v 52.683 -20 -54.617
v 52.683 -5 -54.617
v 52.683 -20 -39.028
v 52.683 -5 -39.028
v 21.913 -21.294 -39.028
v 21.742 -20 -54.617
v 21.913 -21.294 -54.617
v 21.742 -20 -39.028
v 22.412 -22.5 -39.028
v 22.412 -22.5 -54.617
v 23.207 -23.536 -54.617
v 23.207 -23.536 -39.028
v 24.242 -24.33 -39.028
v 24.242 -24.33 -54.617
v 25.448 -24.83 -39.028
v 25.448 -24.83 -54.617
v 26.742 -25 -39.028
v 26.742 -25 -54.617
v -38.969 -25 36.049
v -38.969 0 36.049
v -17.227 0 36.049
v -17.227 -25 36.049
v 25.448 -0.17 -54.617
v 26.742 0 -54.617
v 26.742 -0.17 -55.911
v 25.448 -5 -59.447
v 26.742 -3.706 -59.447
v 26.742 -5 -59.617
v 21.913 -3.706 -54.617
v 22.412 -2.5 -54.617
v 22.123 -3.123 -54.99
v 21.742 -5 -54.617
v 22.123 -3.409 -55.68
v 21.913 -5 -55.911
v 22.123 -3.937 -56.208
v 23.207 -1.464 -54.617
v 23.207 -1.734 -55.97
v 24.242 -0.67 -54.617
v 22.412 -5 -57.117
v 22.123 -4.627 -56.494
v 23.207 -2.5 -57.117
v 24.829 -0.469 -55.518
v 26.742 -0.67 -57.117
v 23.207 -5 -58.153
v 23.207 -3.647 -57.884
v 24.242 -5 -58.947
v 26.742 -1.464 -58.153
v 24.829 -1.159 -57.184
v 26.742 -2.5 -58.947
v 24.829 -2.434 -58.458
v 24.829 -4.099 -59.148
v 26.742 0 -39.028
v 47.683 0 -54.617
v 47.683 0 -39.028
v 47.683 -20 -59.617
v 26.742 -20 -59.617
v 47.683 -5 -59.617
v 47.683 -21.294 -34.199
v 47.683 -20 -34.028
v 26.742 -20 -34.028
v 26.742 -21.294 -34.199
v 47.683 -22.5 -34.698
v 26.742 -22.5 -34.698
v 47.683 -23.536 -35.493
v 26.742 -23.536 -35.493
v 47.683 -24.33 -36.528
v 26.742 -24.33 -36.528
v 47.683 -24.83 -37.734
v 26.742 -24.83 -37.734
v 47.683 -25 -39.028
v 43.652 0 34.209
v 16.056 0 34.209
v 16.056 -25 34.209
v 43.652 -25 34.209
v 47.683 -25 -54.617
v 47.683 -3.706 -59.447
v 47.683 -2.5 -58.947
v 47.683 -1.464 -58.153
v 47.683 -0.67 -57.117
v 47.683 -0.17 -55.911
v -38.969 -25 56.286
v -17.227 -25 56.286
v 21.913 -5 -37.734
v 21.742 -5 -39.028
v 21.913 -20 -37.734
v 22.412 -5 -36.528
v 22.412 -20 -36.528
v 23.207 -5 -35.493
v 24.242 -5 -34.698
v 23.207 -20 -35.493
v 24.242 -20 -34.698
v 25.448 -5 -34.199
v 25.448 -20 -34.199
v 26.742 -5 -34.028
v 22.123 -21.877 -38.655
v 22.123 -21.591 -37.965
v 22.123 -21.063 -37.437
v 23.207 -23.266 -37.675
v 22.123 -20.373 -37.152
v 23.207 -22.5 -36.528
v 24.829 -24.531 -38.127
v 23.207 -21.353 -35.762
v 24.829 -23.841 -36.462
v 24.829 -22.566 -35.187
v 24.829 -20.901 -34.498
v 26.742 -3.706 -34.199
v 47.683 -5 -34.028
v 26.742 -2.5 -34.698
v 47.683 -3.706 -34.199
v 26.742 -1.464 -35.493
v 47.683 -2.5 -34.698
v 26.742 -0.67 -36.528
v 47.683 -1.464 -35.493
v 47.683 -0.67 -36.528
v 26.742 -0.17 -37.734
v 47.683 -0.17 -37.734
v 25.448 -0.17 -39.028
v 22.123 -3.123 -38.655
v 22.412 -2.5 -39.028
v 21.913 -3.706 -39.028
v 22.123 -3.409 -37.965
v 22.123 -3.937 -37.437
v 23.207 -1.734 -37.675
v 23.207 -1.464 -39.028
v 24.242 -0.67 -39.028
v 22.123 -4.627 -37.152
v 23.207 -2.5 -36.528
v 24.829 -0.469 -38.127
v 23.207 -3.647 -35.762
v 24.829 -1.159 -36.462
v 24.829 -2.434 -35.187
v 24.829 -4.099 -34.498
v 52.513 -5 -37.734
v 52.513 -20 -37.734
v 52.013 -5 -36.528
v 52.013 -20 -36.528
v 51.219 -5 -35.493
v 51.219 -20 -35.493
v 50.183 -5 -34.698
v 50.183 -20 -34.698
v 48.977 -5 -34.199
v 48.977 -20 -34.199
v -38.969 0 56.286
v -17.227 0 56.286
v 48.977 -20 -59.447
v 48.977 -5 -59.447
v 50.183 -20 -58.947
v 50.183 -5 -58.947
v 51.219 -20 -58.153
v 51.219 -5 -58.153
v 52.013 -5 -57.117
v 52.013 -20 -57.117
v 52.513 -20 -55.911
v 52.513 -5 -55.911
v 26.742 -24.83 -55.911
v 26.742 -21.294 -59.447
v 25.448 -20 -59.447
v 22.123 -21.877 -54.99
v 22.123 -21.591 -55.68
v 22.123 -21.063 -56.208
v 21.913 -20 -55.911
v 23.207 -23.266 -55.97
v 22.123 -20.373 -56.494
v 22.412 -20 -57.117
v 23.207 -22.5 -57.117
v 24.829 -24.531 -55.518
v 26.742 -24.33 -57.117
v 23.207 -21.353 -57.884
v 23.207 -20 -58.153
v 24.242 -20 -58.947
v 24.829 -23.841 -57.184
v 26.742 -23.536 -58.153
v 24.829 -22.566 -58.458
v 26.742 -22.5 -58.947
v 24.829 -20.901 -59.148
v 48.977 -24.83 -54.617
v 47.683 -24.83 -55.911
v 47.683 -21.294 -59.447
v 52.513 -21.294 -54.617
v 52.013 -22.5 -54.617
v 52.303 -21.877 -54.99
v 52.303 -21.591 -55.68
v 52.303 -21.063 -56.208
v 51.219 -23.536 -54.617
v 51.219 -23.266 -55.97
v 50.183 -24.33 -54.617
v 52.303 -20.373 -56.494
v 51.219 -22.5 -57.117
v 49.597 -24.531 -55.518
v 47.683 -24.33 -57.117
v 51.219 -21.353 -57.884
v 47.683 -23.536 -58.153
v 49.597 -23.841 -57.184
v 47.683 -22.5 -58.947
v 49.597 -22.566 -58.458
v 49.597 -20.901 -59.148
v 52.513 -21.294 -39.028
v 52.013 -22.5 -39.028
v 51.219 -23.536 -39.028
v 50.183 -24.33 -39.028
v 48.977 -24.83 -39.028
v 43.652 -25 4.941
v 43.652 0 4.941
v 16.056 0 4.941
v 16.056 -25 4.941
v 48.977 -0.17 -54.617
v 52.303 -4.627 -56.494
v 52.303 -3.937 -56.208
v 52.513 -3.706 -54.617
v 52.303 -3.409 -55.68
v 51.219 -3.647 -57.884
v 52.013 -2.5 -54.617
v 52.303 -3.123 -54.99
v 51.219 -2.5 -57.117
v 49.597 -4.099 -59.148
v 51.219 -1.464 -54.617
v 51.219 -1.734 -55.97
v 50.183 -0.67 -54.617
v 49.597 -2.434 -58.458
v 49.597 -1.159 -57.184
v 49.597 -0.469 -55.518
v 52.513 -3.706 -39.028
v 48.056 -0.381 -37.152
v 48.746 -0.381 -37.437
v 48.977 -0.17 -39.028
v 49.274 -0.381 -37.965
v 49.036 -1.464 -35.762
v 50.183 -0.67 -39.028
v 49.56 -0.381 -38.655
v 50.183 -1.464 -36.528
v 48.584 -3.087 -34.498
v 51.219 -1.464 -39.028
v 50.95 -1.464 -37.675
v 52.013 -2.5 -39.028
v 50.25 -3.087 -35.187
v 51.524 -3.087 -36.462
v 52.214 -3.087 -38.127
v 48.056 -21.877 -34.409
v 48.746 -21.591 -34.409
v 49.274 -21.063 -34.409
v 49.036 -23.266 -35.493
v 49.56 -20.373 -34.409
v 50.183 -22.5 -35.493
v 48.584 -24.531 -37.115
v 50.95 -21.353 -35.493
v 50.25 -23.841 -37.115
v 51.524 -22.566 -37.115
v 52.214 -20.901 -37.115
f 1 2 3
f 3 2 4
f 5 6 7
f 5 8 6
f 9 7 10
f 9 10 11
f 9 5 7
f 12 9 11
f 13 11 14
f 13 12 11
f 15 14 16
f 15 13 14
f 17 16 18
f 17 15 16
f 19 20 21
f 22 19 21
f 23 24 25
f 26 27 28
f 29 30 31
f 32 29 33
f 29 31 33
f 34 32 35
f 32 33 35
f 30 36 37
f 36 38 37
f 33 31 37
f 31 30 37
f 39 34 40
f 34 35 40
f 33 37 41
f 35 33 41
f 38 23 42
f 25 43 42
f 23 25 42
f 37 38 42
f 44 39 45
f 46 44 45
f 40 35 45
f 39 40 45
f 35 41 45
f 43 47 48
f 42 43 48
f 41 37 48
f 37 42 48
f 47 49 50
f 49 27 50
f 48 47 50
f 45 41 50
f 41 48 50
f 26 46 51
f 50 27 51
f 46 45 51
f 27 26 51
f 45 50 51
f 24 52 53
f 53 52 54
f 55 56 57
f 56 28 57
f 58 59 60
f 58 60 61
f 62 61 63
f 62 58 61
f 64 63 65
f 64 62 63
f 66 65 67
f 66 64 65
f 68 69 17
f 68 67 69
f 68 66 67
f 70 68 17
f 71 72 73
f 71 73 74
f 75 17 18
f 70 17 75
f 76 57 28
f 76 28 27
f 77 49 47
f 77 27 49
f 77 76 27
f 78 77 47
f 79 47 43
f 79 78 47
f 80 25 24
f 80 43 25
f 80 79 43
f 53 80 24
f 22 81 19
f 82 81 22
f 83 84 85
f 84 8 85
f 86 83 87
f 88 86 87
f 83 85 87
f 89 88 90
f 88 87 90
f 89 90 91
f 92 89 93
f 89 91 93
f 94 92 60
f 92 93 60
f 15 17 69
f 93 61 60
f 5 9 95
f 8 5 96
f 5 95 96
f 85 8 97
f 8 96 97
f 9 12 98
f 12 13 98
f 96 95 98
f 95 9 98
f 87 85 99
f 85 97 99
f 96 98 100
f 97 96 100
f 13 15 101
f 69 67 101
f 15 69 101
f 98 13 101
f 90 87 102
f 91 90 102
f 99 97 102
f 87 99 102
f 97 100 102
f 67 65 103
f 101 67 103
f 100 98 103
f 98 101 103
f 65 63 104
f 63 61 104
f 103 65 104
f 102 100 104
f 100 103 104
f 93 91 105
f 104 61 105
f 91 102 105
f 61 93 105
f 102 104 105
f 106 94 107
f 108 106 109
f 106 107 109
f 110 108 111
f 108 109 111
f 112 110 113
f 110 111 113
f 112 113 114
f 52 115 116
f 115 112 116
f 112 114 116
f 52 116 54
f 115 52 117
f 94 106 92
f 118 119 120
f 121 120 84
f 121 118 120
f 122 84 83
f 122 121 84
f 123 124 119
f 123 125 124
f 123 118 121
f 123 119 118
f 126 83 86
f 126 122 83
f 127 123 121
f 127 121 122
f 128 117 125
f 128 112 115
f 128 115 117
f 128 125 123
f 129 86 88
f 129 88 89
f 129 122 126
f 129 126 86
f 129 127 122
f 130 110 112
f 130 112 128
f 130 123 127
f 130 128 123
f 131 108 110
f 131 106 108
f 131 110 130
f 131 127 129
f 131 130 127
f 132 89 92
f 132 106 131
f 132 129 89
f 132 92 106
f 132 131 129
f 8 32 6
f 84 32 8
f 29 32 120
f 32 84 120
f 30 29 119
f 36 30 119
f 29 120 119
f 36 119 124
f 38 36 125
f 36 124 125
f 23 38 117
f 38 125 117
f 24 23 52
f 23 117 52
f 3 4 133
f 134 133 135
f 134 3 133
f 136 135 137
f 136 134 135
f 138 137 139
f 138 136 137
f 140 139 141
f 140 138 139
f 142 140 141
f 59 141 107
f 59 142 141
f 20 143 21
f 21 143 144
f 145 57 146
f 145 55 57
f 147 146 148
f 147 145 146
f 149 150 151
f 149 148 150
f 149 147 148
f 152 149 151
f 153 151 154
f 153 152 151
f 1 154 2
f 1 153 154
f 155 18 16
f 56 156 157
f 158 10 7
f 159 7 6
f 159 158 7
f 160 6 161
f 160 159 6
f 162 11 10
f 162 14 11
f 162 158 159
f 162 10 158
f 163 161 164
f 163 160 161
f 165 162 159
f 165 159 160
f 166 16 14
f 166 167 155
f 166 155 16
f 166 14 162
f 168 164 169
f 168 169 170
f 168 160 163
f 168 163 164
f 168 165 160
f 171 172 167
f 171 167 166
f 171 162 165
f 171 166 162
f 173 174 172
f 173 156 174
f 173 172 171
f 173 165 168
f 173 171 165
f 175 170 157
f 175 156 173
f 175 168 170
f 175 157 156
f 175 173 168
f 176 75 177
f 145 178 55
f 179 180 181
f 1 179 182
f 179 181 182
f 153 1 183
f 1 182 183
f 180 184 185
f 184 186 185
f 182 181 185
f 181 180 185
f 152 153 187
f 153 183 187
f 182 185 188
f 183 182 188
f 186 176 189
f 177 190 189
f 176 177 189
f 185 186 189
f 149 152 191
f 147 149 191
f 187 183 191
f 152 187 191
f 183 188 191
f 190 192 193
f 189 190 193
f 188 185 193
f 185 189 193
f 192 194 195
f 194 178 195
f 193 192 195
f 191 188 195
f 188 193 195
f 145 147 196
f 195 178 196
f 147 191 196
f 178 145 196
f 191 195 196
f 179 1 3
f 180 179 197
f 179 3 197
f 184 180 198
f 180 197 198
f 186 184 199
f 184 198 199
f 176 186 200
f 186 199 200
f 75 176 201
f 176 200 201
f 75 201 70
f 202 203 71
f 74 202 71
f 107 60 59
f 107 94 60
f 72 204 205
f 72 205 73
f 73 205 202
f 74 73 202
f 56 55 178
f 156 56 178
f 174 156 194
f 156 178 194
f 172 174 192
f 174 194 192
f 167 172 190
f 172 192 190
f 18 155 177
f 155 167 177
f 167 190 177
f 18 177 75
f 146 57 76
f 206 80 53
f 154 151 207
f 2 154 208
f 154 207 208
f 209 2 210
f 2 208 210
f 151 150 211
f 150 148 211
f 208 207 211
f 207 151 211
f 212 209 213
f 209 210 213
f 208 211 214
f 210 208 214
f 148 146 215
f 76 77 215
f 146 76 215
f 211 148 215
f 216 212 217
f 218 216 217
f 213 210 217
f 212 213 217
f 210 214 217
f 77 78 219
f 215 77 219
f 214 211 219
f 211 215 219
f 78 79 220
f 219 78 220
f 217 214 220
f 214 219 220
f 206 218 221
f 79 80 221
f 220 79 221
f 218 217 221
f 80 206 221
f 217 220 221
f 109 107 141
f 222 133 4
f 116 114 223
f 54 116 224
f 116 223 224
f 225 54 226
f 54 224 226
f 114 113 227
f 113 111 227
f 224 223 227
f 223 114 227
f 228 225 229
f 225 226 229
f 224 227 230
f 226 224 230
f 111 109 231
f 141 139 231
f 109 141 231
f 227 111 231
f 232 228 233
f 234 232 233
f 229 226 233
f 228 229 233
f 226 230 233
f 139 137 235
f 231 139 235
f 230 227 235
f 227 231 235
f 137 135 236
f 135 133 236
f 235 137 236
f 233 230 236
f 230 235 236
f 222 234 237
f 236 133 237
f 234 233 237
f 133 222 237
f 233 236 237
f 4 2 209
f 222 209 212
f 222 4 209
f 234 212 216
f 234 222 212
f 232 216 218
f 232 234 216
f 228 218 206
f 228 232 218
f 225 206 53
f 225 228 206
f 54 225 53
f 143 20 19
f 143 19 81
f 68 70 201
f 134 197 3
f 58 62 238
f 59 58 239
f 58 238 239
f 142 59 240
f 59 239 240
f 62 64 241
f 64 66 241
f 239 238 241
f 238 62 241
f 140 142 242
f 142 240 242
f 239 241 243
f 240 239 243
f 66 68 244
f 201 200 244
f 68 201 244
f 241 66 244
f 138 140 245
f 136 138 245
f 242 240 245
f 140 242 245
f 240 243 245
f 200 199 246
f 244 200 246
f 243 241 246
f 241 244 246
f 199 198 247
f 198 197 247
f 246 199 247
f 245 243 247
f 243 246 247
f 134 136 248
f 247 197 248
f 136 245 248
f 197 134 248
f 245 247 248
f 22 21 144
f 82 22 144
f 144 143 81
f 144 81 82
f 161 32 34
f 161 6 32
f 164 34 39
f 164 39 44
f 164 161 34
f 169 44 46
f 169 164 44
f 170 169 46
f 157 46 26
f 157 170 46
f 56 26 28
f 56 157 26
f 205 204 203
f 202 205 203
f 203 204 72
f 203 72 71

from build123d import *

# Parameters (mm, degrees)
F0_W     = 21.7422489077
F0_H     = 20.2370174229
F1_DEPTH = 25
F0_W_2   = 27.5959298015
F0_H_2   = 29.2684142478
F0_W_3   = 24.0837205201
F0_H_3   = 16.2230618298
F0_W_4   = 30.9408959001
F0_H_4   = 25.5889557302
F3_R     = 5


with BuildPart() as f1:
    # F0 (on Front) → F1 (new body)
    with BuildSketch(Plane.XZ):
        with Locations((-28.0976770446, 46.1672451347)):
            Rectangle(F0_W, F0_H)
    extrude(amount=F1_DEPTH)


with BuildPart() as f1b:
    # F0 (on Front) → F1, piece 2 (new body)
    with BuildSketch(Plane.XZ):
        with Locations((29.8537798226, 19.574802136)):
            Rectangle(F0_W_2, F0_H_2)
    extrude(amount=F1_DEPTH)


with BuildPart() as f1c:
    # F0 (on Front) → F1, piece 3 (new body)
    with BuildSketch(Plane.XZ):
        with Locations((-22.4112411961, -41.4707455784)):
            Rectangle(F0_W_3, F0_H_3)
    extrude(amount=F1_DEPTH)


with BuildPart() as f1d:
    # F0 (on Front) → F1, piece 4 (new body)
    with BuildSketch(Plane.XZ):
        with Locations((37.2126968578, -46.8226838857)):
            Rectangle(F0_W_4, F0_H_4)
    extrude(amount=F1_DEPTH)

    # F3
    f3_edges = [f1d.edges().sort_by_distance(p)[0] for p in [
        (37.212697, -25, -59.617162),
        (52.683145, -25, -46.822684),
        (37.212697, -25, -34.028206),
        (37.212697, 0, -59.617162),
        (21.742249, -25, -46.822684),
        (52.683145, -12.5, -34.028206),
        (37.212697, 0, -34.028206),
        (52.683145, -12.5, -59.617162),
        (52.683145, 0, -46.822684),
        (21.742249, 0, -46.822684),
        (21.742249, -12.5, -59.617162),
        (21.742249, -12.5, -34.028206),
    ]]
    fillet(f3_edges, radius=F3_R)


solid = Compound([f1.part, f1b.part, f1d.part])
